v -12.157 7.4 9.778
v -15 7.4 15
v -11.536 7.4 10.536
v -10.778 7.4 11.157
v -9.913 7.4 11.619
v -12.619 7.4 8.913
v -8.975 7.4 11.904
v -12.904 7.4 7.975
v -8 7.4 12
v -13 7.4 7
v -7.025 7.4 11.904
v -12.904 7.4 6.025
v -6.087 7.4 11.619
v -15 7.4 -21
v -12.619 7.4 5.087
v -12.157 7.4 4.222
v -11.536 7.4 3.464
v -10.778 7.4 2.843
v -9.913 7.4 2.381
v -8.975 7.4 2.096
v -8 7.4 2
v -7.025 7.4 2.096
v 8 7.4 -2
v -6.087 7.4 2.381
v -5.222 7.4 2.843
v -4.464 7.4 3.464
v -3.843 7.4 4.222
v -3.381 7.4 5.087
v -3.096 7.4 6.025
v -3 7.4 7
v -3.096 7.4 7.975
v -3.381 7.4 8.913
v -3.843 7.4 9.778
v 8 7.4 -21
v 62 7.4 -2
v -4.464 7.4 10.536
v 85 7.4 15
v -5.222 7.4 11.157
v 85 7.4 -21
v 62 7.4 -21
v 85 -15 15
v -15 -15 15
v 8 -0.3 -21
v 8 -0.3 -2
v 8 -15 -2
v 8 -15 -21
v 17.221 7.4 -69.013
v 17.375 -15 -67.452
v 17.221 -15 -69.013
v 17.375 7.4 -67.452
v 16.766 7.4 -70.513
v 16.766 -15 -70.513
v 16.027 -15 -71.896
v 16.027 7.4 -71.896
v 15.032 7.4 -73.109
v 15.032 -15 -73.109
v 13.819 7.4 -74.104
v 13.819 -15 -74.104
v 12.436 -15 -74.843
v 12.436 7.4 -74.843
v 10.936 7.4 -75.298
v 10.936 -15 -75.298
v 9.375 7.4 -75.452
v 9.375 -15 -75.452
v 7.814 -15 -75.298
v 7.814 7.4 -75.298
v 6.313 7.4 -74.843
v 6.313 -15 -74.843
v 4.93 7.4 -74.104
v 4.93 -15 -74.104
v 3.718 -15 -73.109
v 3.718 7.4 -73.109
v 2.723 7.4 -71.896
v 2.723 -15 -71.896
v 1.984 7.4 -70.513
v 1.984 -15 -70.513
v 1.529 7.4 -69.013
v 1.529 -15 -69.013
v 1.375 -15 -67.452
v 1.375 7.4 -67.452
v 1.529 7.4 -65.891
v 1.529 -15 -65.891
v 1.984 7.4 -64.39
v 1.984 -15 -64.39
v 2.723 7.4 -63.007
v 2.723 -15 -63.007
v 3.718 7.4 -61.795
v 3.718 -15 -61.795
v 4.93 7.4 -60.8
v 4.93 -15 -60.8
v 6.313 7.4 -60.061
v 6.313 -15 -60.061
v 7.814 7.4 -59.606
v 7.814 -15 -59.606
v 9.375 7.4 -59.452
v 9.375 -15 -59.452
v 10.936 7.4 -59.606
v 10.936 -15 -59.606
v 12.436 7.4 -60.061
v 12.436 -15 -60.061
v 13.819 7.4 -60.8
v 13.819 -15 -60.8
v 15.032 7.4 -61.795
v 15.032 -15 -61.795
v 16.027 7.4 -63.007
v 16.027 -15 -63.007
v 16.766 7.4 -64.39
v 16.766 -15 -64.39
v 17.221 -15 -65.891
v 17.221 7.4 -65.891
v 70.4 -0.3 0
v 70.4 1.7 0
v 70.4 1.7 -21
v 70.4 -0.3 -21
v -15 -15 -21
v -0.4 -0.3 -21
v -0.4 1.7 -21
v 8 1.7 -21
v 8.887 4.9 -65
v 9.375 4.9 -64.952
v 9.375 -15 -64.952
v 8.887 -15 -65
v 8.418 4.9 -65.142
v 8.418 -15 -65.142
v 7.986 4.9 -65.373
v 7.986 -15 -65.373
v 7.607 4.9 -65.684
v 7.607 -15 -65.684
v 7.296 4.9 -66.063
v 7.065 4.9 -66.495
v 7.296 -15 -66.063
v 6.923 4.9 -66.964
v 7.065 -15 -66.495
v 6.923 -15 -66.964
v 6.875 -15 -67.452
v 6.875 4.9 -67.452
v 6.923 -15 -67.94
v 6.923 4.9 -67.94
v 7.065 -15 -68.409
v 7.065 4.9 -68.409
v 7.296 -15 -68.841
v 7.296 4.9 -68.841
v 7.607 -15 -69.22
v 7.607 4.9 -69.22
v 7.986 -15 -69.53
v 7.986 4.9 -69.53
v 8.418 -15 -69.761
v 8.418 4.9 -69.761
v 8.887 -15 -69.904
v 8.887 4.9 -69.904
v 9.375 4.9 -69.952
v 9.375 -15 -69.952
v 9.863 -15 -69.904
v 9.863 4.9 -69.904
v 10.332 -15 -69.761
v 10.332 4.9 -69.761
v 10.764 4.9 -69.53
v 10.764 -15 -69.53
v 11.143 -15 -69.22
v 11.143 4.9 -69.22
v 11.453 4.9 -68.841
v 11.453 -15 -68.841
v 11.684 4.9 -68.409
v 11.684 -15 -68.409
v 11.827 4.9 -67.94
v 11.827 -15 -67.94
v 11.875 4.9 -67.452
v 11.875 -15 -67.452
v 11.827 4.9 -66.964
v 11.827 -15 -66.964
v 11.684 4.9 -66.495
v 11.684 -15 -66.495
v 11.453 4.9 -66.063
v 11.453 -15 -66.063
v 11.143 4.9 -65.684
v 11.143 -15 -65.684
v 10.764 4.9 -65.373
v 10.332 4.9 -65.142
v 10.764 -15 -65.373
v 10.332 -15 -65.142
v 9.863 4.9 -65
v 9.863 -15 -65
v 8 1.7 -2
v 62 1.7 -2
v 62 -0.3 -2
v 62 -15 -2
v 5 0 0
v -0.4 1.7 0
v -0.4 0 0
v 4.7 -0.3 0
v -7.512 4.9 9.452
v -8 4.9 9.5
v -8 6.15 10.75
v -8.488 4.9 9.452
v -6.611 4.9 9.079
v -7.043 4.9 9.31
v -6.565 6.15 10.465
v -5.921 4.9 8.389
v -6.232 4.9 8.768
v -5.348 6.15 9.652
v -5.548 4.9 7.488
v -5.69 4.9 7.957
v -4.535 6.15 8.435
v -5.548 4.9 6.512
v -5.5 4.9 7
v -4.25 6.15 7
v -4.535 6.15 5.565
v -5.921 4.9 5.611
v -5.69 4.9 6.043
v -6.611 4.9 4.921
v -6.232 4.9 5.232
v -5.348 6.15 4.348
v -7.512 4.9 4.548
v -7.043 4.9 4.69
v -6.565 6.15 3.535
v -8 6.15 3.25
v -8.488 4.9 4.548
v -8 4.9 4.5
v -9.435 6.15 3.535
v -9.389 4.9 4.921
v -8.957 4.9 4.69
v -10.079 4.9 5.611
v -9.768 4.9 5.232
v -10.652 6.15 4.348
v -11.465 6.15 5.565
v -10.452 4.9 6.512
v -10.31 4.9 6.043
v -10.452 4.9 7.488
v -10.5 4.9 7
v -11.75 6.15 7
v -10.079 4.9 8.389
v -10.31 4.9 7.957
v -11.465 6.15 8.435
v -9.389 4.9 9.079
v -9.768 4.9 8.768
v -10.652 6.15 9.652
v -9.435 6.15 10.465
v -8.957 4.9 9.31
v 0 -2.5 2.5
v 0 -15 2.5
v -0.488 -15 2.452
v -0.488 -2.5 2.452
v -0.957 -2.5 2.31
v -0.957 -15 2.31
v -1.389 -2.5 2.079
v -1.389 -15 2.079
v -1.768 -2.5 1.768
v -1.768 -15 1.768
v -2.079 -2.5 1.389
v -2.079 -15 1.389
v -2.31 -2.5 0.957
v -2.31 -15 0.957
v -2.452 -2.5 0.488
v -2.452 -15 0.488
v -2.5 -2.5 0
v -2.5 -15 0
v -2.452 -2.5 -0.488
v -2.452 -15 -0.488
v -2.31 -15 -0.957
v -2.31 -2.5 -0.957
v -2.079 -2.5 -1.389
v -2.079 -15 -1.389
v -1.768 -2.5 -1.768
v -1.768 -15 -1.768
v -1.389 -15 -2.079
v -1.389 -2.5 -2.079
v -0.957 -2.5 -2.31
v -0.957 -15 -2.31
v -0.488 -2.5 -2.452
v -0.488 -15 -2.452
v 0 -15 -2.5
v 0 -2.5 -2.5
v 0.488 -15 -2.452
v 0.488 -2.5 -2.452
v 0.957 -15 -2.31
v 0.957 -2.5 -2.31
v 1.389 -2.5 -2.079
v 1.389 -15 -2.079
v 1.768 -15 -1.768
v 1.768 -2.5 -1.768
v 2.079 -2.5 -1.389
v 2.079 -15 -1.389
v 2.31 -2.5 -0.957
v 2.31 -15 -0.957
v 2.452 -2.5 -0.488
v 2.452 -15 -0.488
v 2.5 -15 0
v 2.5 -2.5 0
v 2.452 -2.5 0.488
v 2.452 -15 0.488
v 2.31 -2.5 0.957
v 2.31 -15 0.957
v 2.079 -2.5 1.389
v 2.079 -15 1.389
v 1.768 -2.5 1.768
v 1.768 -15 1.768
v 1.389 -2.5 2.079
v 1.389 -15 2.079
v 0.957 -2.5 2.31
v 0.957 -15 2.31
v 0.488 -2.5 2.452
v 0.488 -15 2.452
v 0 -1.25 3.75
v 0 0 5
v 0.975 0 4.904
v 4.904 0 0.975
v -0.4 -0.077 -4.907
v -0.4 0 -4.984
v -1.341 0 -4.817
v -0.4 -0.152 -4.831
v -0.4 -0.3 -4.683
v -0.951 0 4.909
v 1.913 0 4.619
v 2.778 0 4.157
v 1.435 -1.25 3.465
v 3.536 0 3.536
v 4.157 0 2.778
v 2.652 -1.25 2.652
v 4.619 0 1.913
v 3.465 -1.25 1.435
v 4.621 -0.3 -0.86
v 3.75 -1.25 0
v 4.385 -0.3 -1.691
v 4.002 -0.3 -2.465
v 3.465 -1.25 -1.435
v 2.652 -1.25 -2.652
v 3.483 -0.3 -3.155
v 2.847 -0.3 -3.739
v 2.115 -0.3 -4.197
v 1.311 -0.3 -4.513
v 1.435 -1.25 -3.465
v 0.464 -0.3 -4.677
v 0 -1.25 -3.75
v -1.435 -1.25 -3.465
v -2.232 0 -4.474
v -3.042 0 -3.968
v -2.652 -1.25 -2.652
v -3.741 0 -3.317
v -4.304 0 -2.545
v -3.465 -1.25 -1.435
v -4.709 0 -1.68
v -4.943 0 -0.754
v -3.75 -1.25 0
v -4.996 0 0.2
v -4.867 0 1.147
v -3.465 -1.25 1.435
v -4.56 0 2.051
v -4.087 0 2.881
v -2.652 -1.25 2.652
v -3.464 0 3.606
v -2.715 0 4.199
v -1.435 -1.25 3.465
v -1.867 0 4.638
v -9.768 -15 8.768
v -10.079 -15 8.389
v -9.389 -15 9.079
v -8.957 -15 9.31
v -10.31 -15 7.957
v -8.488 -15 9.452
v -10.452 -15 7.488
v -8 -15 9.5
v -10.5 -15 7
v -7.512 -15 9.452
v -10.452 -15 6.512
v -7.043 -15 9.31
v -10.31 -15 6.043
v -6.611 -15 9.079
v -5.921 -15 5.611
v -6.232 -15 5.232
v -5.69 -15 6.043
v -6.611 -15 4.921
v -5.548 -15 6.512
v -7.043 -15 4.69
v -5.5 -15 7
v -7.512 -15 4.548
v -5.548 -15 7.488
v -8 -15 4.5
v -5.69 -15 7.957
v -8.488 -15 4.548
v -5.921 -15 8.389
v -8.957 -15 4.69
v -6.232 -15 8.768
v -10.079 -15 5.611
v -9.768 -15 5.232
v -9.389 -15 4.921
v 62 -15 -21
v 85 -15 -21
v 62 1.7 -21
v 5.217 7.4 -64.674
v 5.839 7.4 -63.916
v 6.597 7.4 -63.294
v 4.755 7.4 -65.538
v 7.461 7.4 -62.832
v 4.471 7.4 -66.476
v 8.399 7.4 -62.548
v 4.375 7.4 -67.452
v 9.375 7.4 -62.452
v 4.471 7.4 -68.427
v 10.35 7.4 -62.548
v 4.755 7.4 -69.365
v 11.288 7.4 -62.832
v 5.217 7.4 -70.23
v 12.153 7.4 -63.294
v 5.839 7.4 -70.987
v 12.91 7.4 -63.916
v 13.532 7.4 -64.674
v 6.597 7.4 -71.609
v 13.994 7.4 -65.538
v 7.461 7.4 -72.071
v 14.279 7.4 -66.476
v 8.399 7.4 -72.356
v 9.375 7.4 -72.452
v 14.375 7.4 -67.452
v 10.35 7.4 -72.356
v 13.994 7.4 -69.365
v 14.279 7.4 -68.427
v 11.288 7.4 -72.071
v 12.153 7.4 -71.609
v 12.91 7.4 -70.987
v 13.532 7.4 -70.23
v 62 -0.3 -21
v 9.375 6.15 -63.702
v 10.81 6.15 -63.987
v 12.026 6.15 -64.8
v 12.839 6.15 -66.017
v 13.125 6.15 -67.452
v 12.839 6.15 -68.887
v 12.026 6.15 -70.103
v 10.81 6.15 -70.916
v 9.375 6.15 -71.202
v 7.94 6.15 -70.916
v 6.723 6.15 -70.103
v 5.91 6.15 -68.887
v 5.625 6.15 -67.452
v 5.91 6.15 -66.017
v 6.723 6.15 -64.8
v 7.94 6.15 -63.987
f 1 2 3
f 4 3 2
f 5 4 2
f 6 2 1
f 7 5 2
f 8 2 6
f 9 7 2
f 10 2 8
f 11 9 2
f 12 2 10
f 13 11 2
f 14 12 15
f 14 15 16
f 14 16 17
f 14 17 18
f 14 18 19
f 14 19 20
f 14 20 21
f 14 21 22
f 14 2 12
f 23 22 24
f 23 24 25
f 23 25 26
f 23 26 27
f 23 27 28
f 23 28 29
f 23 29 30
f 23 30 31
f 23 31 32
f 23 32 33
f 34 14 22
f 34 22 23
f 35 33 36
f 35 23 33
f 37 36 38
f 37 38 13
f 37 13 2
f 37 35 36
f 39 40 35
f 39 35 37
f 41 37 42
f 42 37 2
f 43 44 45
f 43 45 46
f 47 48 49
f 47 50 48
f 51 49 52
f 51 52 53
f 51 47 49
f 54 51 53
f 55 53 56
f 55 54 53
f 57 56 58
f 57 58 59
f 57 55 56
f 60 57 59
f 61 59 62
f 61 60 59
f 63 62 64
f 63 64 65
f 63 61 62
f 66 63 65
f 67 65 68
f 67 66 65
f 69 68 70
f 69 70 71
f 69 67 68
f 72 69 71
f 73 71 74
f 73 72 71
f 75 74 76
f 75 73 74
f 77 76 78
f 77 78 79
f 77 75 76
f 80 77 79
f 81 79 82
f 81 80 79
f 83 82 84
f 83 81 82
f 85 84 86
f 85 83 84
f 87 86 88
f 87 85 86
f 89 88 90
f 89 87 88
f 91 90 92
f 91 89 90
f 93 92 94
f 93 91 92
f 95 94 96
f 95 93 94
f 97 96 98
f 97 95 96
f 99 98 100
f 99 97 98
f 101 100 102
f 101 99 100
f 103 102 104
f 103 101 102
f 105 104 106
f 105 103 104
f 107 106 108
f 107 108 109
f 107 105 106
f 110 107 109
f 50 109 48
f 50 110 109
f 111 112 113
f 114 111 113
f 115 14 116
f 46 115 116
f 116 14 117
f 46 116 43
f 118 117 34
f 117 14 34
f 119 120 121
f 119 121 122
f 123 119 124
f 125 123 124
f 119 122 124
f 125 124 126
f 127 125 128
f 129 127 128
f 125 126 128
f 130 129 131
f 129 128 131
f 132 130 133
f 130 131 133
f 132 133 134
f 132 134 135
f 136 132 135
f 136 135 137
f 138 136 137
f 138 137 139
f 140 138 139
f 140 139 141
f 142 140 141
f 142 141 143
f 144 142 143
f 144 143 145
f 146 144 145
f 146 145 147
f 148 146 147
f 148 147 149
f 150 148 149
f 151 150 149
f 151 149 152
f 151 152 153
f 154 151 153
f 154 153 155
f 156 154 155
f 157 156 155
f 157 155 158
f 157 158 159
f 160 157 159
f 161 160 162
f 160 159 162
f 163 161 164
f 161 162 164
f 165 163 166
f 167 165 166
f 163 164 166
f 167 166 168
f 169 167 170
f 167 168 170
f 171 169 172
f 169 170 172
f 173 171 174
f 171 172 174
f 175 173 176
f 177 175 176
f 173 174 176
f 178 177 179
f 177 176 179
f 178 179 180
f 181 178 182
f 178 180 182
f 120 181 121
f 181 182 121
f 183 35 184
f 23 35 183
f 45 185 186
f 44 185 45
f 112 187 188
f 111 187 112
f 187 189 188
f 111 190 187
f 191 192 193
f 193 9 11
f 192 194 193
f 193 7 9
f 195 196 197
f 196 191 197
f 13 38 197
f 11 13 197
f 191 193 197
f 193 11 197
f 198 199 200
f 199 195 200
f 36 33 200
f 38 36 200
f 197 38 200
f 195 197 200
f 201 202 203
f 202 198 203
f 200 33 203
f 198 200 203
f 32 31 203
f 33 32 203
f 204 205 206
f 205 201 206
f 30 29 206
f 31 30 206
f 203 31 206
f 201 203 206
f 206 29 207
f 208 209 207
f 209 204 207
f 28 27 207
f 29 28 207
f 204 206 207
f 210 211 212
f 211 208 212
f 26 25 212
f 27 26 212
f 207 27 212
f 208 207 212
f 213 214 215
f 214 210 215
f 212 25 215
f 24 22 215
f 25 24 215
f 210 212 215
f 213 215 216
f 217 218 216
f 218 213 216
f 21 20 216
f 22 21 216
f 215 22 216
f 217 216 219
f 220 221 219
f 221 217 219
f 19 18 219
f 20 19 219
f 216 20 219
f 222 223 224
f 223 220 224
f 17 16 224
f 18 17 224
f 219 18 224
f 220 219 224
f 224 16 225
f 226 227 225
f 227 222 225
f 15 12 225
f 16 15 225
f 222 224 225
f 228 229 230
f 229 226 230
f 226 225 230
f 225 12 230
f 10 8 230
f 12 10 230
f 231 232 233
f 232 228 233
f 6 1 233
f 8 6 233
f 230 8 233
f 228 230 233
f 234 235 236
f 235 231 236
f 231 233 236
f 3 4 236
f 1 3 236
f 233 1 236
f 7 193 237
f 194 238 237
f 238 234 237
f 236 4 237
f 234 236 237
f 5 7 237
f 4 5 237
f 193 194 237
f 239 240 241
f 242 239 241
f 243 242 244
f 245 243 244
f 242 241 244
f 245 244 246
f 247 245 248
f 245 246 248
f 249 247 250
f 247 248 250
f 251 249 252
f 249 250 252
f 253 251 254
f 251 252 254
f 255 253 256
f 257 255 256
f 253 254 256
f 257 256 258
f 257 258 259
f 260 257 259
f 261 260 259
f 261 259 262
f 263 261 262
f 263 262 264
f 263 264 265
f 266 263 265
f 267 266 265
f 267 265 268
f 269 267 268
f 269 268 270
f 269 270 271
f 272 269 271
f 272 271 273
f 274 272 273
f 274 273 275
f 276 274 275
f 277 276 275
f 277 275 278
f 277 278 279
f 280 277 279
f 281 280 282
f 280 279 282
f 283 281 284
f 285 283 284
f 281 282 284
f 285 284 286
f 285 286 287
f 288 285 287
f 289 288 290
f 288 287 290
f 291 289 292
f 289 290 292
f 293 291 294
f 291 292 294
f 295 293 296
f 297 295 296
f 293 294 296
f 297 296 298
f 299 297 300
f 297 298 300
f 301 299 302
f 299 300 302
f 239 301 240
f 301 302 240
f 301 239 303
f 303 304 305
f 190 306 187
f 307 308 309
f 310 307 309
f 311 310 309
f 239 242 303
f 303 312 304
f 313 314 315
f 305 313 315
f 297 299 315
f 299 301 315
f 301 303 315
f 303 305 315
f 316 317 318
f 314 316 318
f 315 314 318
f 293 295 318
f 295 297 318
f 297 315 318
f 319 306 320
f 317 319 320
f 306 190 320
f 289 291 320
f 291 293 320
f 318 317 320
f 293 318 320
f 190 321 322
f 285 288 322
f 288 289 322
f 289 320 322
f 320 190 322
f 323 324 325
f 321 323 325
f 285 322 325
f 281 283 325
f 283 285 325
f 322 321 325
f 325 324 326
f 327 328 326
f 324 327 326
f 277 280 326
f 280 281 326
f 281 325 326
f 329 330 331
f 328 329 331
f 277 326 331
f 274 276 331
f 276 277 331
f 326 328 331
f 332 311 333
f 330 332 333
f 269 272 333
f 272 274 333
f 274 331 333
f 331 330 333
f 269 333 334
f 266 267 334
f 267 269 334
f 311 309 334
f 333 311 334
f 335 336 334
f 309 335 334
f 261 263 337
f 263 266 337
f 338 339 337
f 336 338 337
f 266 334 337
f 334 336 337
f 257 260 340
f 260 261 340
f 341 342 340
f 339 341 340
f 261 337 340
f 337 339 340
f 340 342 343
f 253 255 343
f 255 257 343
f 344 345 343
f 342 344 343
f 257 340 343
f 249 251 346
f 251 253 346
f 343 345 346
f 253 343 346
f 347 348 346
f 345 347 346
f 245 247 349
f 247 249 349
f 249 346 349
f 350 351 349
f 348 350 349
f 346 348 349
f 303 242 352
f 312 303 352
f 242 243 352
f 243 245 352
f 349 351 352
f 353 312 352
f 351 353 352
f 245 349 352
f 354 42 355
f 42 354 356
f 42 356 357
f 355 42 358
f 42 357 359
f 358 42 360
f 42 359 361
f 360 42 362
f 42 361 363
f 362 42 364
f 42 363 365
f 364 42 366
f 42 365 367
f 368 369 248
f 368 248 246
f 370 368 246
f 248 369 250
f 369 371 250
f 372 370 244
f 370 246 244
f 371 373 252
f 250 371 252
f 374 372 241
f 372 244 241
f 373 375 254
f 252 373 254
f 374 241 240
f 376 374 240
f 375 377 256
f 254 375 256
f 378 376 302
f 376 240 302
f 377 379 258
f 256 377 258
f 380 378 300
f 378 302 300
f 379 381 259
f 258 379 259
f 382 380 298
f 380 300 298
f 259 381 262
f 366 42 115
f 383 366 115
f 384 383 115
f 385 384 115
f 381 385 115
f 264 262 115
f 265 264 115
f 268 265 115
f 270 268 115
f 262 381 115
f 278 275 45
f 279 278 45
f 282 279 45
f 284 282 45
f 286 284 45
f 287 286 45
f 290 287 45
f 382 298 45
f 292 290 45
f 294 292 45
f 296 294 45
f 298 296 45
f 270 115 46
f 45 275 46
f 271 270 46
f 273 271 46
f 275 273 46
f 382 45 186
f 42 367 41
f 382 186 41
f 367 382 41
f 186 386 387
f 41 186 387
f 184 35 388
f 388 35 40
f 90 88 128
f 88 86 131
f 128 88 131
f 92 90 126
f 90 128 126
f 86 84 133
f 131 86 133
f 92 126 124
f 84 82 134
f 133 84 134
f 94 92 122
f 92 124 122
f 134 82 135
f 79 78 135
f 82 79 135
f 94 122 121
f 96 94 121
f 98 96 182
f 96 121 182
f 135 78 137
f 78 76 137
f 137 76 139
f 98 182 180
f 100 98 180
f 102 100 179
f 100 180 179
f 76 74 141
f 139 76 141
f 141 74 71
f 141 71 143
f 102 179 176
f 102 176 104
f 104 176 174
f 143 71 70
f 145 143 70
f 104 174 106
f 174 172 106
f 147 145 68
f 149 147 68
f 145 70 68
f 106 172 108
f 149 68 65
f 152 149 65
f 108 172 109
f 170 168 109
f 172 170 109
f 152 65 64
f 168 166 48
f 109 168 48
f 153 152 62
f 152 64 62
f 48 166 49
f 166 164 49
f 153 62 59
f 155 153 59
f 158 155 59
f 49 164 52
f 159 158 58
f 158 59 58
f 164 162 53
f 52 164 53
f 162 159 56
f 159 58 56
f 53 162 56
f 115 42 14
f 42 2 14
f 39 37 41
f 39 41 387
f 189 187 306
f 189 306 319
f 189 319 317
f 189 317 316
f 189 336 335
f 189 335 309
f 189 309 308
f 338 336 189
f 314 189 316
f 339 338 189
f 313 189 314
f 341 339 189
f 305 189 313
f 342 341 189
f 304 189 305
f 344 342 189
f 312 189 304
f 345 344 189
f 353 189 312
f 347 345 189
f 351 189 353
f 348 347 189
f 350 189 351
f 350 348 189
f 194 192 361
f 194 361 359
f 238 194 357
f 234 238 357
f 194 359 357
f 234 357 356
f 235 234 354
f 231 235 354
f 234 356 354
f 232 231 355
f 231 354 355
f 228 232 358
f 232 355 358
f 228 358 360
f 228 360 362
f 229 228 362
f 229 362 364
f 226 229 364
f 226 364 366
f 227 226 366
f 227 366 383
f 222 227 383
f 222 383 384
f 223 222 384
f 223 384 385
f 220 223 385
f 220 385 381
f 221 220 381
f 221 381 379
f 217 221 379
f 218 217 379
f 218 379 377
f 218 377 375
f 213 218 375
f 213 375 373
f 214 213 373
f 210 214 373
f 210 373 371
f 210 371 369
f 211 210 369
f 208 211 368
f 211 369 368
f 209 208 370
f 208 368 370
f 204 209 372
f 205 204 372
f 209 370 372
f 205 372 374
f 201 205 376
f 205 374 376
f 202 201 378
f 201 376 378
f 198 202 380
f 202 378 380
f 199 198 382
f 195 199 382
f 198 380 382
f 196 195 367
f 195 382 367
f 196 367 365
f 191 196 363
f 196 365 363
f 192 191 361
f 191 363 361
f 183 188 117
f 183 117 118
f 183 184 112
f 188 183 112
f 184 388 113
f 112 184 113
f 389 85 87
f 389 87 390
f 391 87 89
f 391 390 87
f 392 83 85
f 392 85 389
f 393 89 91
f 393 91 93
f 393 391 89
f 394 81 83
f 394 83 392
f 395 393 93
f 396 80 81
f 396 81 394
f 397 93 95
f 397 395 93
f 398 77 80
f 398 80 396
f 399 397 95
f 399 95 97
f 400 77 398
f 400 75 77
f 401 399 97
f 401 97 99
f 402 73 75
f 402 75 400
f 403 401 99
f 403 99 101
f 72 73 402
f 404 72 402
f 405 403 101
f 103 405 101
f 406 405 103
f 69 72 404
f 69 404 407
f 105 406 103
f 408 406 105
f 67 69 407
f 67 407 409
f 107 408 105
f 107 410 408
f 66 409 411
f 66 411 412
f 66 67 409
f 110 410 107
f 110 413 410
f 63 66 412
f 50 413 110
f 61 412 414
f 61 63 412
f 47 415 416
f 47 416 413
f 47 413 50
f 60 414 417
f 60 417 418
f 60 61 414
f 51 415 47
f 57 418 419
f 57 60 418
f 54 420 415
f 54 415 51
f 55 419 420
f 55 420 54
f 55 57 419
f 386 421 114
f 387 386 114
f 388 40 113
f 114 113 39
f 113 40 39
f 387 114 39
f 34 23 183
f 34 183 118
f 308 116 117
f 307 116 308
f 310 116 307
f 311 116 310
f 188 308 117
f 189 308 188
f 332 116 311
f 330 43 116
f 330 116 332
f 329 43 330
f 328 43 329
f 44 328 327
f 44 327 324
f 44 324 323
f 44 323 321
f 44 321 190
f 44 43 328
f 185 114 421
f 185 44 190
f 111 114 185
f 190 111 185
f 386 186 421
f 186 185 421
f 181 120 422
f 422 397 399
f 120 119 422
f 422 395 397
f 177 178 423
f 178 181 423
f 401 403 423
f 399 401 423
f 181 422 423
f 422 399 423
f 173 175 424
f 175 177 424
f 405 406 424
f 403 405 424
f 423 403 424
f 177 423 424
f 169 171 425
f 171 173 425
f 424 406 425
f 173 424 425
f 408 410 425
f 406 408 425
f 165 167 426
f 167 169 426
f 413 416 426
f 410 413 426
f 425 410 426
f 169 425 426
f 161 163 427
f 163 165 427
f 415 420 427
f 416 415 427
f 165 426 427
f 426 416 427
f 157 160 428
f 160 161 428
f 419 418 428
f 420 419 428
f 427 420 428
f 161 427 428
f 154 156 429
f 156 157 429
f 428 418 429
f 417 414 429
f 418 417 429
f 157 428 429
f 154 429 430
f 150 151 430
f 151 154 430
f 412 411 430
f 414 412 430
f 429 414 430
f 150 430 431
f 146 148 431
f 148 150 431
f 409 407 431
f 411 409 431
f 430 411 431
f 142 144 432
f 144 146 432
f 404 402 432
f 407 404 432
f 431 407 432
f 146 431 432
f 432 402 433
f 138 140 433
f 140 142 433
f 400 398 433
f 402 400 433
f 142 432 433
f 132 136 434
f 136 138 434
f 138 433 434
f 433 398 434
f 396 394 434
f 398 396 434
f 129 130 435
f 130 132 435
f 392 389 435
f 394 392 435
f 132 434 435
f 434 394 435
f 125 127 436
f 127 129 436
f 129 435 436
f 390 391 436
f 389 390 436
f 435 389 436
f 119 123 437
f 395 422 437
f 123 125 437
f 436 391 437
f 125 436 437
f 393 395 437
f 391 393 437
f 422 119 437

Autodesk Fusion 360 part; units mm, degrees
sketch "Sketch1" plane through (0, 0, 0) normal (0, 1, 0) x (1, 0, 0)
  line L0 (0, 0) -> (70, 0)
  line L1 (70, 0) -> (70, 50)
  line L2 (70, 50) -> (0, 50)
  line L3 (0, 50) -> (0, 0)
  dimension "d1" = 70
  dimension "d2" = 50
extrude "Extrude1" add sketch "Sketch1" along normal blind 1.4 makes body 1
sketch "Sketch2" plane through (0, 0, 0) normal (0, 1, 0) x (1, 0, 0)
  line L0 (0, 0) -> (70, 0)
  line L1 (70, 0) -> (70, 2)
  line L2 (70, 2) -> (0, 2)
  line L3 (0, 2) -> (0, 0)
  line L4 (0, 0) -> (8, 0)
  line L5 (8, 0) -> (8, 21)
  line L6 (8, 21) -> (0, 21)
  line L7 (0, 21) -> (0, 0)
  line L8 (70, 0) -> (62, 0)
  line L9 (62, 0) -> (62, 21)
  line L10 (62, 21) -> (70, 21)
  line L11 (70, 21) -> (70, 0)
  line L12 (0, 0) -> (-15, 0)
  line L13 (-15, 0) -> (-15, -15)
  line L14 (-15, -15) -> (0, -15)
  line L15 (0, -15) -> (0, 0)
  line L16 (-15, -15) -> (85, -15)
  line L17 (85, -15) -> (85, 21)
  line L18 (85, 21) -> (-15, 21)
  line L19 (-15, 21) -> (-15, -15)
  dimension "d5" = 70
  dimension "d6" = 2
  dimension "d7" = 8
  dimension "d8" = 21
  dimension "d9" = 8
  dimension "d10" = 21
  dimension "d11" = 15
  dimension "d12" = 15
  dimension "d13" = 100
  dimension "d14" = 36
extrude "Extrude2" add sketch "Sketch2" along normal up to surface (1.4 mm away) separate body contours L0 L2 L3 L4 L5 L7 | L3 L7 L12 L18 L19 | L12 L13 L14 L15 L16 L19 | L0 L1 L4 L8 L11 L15 L16 L17 L18 | L0 L2 L5 L9 | L2 L5 L6 L7 L18 | L0 L1 L2 L8 L9 L11 | L2 L9 L10 L11 L18 makes body 2
extrude "Extrude3" add 1 faces at (-7.3333, 1.4, -2.6667) along direction (0, 1, 0) blind 6 on bodies 2 bodies 2
extrude "Extrude4" add 1 faces at (-7.3333, 0, -2.6667) along direction (0, -1, 0) blind 15 on bodies 2 bodies 2
combine "Combine1" operation cut target body 2 tool bodies 1 keep tools
extrude "Extrude5" cut 1 faces at (2.6667, 1.4, -7.6667) along direction (0, 1, 0) blind 0.3 on bodies 2 bodies 2
extrude "Extrude6" cut 1 faces at (2.6667, 0, -7.6667) along direction (0, -1, 0) blind 0.3 on bodies 2 bodies 2
extrude "Extrude7" cut 1 faces at (0, 0.3667, -7) along direction (-1, 0, 0) blind 0.4 on bodies 2 bodies 2
extrude "Extrude8" cut 1 faces at (70, 1.0333, -7) along direction (1, 0, 0) blind 0.4 on bodies 2 bodies 2
sketch "Sketch3" plane through (0, 7.4, 0) normal (0, 1, 0) x (-1, 0, 0)
  line L0 (-62, -21) -> (-62, -2)
  line L1 (-62, -2) -> (-8, -2)
  line L2 (-8, -2) -> (-8, -21)
  line L3 (-8, -21) -> (15, -21)
  line L4 (15, -21) -> (15, 15)
  line L5 (15, 15) -> (-85, 15)
  line L6 (-85, 15) -> (-85, -21)
  line L7 (-85, -21) -> (-62, -21)
  line L8 (15, -21) -> (8, -21)
  line L9 (8, -21) -> (8, 7)
  line L10 (8, 7) -> (15, 7)
  line L11 (15, 7) -> (15, -21)
  line L12 (-85, -21) -> (-78, -21)
  line L13 (-78, -21) -> (-78, 7)
  line L14 (-78, 7) -> (-85, 7)
  line L15 (-85, 7) -> (-85, -21)
  dimension "d29" = 7
  dimension "d30" = 28
  dimension "d31" = 7
  dimension "d32" = 28
hole "Hole1" at (-8, 7.4, 7) at (0, 0, 0) direction (0, -1, 0) diameter 5 depth 40 tip angle 118 countersink diameter 10 countersink angle 90 bodies 2
sketch "Sketch4" plane through (0, 0, 0) normal (0, 1, 0) x (1, 0, 0)
  circle A0 centre (9.3748, 67.4518) radius 8
  dimension "d38" = 16
extrude "Extrude9" add sketch "Sketch4" against normal up to surface (15 mm away) separate body makes body 3
extrude "Extrude10" add 1 faces at (7.0259, 0, -69.325) along direction (0, 1, 0) up to surface (7.4 mm away) on bodies 3 bodies 3
hole "Hole2" at (9.3748, 7.4, -67.4518) direction (0, -1, 0) diameter 5 depth 40 tip angle 118 countersink diameter 10 countersink angle 90 bodies 3
hidden bodies 1
equation "d13 = 85.000 mm + 15 mm"
